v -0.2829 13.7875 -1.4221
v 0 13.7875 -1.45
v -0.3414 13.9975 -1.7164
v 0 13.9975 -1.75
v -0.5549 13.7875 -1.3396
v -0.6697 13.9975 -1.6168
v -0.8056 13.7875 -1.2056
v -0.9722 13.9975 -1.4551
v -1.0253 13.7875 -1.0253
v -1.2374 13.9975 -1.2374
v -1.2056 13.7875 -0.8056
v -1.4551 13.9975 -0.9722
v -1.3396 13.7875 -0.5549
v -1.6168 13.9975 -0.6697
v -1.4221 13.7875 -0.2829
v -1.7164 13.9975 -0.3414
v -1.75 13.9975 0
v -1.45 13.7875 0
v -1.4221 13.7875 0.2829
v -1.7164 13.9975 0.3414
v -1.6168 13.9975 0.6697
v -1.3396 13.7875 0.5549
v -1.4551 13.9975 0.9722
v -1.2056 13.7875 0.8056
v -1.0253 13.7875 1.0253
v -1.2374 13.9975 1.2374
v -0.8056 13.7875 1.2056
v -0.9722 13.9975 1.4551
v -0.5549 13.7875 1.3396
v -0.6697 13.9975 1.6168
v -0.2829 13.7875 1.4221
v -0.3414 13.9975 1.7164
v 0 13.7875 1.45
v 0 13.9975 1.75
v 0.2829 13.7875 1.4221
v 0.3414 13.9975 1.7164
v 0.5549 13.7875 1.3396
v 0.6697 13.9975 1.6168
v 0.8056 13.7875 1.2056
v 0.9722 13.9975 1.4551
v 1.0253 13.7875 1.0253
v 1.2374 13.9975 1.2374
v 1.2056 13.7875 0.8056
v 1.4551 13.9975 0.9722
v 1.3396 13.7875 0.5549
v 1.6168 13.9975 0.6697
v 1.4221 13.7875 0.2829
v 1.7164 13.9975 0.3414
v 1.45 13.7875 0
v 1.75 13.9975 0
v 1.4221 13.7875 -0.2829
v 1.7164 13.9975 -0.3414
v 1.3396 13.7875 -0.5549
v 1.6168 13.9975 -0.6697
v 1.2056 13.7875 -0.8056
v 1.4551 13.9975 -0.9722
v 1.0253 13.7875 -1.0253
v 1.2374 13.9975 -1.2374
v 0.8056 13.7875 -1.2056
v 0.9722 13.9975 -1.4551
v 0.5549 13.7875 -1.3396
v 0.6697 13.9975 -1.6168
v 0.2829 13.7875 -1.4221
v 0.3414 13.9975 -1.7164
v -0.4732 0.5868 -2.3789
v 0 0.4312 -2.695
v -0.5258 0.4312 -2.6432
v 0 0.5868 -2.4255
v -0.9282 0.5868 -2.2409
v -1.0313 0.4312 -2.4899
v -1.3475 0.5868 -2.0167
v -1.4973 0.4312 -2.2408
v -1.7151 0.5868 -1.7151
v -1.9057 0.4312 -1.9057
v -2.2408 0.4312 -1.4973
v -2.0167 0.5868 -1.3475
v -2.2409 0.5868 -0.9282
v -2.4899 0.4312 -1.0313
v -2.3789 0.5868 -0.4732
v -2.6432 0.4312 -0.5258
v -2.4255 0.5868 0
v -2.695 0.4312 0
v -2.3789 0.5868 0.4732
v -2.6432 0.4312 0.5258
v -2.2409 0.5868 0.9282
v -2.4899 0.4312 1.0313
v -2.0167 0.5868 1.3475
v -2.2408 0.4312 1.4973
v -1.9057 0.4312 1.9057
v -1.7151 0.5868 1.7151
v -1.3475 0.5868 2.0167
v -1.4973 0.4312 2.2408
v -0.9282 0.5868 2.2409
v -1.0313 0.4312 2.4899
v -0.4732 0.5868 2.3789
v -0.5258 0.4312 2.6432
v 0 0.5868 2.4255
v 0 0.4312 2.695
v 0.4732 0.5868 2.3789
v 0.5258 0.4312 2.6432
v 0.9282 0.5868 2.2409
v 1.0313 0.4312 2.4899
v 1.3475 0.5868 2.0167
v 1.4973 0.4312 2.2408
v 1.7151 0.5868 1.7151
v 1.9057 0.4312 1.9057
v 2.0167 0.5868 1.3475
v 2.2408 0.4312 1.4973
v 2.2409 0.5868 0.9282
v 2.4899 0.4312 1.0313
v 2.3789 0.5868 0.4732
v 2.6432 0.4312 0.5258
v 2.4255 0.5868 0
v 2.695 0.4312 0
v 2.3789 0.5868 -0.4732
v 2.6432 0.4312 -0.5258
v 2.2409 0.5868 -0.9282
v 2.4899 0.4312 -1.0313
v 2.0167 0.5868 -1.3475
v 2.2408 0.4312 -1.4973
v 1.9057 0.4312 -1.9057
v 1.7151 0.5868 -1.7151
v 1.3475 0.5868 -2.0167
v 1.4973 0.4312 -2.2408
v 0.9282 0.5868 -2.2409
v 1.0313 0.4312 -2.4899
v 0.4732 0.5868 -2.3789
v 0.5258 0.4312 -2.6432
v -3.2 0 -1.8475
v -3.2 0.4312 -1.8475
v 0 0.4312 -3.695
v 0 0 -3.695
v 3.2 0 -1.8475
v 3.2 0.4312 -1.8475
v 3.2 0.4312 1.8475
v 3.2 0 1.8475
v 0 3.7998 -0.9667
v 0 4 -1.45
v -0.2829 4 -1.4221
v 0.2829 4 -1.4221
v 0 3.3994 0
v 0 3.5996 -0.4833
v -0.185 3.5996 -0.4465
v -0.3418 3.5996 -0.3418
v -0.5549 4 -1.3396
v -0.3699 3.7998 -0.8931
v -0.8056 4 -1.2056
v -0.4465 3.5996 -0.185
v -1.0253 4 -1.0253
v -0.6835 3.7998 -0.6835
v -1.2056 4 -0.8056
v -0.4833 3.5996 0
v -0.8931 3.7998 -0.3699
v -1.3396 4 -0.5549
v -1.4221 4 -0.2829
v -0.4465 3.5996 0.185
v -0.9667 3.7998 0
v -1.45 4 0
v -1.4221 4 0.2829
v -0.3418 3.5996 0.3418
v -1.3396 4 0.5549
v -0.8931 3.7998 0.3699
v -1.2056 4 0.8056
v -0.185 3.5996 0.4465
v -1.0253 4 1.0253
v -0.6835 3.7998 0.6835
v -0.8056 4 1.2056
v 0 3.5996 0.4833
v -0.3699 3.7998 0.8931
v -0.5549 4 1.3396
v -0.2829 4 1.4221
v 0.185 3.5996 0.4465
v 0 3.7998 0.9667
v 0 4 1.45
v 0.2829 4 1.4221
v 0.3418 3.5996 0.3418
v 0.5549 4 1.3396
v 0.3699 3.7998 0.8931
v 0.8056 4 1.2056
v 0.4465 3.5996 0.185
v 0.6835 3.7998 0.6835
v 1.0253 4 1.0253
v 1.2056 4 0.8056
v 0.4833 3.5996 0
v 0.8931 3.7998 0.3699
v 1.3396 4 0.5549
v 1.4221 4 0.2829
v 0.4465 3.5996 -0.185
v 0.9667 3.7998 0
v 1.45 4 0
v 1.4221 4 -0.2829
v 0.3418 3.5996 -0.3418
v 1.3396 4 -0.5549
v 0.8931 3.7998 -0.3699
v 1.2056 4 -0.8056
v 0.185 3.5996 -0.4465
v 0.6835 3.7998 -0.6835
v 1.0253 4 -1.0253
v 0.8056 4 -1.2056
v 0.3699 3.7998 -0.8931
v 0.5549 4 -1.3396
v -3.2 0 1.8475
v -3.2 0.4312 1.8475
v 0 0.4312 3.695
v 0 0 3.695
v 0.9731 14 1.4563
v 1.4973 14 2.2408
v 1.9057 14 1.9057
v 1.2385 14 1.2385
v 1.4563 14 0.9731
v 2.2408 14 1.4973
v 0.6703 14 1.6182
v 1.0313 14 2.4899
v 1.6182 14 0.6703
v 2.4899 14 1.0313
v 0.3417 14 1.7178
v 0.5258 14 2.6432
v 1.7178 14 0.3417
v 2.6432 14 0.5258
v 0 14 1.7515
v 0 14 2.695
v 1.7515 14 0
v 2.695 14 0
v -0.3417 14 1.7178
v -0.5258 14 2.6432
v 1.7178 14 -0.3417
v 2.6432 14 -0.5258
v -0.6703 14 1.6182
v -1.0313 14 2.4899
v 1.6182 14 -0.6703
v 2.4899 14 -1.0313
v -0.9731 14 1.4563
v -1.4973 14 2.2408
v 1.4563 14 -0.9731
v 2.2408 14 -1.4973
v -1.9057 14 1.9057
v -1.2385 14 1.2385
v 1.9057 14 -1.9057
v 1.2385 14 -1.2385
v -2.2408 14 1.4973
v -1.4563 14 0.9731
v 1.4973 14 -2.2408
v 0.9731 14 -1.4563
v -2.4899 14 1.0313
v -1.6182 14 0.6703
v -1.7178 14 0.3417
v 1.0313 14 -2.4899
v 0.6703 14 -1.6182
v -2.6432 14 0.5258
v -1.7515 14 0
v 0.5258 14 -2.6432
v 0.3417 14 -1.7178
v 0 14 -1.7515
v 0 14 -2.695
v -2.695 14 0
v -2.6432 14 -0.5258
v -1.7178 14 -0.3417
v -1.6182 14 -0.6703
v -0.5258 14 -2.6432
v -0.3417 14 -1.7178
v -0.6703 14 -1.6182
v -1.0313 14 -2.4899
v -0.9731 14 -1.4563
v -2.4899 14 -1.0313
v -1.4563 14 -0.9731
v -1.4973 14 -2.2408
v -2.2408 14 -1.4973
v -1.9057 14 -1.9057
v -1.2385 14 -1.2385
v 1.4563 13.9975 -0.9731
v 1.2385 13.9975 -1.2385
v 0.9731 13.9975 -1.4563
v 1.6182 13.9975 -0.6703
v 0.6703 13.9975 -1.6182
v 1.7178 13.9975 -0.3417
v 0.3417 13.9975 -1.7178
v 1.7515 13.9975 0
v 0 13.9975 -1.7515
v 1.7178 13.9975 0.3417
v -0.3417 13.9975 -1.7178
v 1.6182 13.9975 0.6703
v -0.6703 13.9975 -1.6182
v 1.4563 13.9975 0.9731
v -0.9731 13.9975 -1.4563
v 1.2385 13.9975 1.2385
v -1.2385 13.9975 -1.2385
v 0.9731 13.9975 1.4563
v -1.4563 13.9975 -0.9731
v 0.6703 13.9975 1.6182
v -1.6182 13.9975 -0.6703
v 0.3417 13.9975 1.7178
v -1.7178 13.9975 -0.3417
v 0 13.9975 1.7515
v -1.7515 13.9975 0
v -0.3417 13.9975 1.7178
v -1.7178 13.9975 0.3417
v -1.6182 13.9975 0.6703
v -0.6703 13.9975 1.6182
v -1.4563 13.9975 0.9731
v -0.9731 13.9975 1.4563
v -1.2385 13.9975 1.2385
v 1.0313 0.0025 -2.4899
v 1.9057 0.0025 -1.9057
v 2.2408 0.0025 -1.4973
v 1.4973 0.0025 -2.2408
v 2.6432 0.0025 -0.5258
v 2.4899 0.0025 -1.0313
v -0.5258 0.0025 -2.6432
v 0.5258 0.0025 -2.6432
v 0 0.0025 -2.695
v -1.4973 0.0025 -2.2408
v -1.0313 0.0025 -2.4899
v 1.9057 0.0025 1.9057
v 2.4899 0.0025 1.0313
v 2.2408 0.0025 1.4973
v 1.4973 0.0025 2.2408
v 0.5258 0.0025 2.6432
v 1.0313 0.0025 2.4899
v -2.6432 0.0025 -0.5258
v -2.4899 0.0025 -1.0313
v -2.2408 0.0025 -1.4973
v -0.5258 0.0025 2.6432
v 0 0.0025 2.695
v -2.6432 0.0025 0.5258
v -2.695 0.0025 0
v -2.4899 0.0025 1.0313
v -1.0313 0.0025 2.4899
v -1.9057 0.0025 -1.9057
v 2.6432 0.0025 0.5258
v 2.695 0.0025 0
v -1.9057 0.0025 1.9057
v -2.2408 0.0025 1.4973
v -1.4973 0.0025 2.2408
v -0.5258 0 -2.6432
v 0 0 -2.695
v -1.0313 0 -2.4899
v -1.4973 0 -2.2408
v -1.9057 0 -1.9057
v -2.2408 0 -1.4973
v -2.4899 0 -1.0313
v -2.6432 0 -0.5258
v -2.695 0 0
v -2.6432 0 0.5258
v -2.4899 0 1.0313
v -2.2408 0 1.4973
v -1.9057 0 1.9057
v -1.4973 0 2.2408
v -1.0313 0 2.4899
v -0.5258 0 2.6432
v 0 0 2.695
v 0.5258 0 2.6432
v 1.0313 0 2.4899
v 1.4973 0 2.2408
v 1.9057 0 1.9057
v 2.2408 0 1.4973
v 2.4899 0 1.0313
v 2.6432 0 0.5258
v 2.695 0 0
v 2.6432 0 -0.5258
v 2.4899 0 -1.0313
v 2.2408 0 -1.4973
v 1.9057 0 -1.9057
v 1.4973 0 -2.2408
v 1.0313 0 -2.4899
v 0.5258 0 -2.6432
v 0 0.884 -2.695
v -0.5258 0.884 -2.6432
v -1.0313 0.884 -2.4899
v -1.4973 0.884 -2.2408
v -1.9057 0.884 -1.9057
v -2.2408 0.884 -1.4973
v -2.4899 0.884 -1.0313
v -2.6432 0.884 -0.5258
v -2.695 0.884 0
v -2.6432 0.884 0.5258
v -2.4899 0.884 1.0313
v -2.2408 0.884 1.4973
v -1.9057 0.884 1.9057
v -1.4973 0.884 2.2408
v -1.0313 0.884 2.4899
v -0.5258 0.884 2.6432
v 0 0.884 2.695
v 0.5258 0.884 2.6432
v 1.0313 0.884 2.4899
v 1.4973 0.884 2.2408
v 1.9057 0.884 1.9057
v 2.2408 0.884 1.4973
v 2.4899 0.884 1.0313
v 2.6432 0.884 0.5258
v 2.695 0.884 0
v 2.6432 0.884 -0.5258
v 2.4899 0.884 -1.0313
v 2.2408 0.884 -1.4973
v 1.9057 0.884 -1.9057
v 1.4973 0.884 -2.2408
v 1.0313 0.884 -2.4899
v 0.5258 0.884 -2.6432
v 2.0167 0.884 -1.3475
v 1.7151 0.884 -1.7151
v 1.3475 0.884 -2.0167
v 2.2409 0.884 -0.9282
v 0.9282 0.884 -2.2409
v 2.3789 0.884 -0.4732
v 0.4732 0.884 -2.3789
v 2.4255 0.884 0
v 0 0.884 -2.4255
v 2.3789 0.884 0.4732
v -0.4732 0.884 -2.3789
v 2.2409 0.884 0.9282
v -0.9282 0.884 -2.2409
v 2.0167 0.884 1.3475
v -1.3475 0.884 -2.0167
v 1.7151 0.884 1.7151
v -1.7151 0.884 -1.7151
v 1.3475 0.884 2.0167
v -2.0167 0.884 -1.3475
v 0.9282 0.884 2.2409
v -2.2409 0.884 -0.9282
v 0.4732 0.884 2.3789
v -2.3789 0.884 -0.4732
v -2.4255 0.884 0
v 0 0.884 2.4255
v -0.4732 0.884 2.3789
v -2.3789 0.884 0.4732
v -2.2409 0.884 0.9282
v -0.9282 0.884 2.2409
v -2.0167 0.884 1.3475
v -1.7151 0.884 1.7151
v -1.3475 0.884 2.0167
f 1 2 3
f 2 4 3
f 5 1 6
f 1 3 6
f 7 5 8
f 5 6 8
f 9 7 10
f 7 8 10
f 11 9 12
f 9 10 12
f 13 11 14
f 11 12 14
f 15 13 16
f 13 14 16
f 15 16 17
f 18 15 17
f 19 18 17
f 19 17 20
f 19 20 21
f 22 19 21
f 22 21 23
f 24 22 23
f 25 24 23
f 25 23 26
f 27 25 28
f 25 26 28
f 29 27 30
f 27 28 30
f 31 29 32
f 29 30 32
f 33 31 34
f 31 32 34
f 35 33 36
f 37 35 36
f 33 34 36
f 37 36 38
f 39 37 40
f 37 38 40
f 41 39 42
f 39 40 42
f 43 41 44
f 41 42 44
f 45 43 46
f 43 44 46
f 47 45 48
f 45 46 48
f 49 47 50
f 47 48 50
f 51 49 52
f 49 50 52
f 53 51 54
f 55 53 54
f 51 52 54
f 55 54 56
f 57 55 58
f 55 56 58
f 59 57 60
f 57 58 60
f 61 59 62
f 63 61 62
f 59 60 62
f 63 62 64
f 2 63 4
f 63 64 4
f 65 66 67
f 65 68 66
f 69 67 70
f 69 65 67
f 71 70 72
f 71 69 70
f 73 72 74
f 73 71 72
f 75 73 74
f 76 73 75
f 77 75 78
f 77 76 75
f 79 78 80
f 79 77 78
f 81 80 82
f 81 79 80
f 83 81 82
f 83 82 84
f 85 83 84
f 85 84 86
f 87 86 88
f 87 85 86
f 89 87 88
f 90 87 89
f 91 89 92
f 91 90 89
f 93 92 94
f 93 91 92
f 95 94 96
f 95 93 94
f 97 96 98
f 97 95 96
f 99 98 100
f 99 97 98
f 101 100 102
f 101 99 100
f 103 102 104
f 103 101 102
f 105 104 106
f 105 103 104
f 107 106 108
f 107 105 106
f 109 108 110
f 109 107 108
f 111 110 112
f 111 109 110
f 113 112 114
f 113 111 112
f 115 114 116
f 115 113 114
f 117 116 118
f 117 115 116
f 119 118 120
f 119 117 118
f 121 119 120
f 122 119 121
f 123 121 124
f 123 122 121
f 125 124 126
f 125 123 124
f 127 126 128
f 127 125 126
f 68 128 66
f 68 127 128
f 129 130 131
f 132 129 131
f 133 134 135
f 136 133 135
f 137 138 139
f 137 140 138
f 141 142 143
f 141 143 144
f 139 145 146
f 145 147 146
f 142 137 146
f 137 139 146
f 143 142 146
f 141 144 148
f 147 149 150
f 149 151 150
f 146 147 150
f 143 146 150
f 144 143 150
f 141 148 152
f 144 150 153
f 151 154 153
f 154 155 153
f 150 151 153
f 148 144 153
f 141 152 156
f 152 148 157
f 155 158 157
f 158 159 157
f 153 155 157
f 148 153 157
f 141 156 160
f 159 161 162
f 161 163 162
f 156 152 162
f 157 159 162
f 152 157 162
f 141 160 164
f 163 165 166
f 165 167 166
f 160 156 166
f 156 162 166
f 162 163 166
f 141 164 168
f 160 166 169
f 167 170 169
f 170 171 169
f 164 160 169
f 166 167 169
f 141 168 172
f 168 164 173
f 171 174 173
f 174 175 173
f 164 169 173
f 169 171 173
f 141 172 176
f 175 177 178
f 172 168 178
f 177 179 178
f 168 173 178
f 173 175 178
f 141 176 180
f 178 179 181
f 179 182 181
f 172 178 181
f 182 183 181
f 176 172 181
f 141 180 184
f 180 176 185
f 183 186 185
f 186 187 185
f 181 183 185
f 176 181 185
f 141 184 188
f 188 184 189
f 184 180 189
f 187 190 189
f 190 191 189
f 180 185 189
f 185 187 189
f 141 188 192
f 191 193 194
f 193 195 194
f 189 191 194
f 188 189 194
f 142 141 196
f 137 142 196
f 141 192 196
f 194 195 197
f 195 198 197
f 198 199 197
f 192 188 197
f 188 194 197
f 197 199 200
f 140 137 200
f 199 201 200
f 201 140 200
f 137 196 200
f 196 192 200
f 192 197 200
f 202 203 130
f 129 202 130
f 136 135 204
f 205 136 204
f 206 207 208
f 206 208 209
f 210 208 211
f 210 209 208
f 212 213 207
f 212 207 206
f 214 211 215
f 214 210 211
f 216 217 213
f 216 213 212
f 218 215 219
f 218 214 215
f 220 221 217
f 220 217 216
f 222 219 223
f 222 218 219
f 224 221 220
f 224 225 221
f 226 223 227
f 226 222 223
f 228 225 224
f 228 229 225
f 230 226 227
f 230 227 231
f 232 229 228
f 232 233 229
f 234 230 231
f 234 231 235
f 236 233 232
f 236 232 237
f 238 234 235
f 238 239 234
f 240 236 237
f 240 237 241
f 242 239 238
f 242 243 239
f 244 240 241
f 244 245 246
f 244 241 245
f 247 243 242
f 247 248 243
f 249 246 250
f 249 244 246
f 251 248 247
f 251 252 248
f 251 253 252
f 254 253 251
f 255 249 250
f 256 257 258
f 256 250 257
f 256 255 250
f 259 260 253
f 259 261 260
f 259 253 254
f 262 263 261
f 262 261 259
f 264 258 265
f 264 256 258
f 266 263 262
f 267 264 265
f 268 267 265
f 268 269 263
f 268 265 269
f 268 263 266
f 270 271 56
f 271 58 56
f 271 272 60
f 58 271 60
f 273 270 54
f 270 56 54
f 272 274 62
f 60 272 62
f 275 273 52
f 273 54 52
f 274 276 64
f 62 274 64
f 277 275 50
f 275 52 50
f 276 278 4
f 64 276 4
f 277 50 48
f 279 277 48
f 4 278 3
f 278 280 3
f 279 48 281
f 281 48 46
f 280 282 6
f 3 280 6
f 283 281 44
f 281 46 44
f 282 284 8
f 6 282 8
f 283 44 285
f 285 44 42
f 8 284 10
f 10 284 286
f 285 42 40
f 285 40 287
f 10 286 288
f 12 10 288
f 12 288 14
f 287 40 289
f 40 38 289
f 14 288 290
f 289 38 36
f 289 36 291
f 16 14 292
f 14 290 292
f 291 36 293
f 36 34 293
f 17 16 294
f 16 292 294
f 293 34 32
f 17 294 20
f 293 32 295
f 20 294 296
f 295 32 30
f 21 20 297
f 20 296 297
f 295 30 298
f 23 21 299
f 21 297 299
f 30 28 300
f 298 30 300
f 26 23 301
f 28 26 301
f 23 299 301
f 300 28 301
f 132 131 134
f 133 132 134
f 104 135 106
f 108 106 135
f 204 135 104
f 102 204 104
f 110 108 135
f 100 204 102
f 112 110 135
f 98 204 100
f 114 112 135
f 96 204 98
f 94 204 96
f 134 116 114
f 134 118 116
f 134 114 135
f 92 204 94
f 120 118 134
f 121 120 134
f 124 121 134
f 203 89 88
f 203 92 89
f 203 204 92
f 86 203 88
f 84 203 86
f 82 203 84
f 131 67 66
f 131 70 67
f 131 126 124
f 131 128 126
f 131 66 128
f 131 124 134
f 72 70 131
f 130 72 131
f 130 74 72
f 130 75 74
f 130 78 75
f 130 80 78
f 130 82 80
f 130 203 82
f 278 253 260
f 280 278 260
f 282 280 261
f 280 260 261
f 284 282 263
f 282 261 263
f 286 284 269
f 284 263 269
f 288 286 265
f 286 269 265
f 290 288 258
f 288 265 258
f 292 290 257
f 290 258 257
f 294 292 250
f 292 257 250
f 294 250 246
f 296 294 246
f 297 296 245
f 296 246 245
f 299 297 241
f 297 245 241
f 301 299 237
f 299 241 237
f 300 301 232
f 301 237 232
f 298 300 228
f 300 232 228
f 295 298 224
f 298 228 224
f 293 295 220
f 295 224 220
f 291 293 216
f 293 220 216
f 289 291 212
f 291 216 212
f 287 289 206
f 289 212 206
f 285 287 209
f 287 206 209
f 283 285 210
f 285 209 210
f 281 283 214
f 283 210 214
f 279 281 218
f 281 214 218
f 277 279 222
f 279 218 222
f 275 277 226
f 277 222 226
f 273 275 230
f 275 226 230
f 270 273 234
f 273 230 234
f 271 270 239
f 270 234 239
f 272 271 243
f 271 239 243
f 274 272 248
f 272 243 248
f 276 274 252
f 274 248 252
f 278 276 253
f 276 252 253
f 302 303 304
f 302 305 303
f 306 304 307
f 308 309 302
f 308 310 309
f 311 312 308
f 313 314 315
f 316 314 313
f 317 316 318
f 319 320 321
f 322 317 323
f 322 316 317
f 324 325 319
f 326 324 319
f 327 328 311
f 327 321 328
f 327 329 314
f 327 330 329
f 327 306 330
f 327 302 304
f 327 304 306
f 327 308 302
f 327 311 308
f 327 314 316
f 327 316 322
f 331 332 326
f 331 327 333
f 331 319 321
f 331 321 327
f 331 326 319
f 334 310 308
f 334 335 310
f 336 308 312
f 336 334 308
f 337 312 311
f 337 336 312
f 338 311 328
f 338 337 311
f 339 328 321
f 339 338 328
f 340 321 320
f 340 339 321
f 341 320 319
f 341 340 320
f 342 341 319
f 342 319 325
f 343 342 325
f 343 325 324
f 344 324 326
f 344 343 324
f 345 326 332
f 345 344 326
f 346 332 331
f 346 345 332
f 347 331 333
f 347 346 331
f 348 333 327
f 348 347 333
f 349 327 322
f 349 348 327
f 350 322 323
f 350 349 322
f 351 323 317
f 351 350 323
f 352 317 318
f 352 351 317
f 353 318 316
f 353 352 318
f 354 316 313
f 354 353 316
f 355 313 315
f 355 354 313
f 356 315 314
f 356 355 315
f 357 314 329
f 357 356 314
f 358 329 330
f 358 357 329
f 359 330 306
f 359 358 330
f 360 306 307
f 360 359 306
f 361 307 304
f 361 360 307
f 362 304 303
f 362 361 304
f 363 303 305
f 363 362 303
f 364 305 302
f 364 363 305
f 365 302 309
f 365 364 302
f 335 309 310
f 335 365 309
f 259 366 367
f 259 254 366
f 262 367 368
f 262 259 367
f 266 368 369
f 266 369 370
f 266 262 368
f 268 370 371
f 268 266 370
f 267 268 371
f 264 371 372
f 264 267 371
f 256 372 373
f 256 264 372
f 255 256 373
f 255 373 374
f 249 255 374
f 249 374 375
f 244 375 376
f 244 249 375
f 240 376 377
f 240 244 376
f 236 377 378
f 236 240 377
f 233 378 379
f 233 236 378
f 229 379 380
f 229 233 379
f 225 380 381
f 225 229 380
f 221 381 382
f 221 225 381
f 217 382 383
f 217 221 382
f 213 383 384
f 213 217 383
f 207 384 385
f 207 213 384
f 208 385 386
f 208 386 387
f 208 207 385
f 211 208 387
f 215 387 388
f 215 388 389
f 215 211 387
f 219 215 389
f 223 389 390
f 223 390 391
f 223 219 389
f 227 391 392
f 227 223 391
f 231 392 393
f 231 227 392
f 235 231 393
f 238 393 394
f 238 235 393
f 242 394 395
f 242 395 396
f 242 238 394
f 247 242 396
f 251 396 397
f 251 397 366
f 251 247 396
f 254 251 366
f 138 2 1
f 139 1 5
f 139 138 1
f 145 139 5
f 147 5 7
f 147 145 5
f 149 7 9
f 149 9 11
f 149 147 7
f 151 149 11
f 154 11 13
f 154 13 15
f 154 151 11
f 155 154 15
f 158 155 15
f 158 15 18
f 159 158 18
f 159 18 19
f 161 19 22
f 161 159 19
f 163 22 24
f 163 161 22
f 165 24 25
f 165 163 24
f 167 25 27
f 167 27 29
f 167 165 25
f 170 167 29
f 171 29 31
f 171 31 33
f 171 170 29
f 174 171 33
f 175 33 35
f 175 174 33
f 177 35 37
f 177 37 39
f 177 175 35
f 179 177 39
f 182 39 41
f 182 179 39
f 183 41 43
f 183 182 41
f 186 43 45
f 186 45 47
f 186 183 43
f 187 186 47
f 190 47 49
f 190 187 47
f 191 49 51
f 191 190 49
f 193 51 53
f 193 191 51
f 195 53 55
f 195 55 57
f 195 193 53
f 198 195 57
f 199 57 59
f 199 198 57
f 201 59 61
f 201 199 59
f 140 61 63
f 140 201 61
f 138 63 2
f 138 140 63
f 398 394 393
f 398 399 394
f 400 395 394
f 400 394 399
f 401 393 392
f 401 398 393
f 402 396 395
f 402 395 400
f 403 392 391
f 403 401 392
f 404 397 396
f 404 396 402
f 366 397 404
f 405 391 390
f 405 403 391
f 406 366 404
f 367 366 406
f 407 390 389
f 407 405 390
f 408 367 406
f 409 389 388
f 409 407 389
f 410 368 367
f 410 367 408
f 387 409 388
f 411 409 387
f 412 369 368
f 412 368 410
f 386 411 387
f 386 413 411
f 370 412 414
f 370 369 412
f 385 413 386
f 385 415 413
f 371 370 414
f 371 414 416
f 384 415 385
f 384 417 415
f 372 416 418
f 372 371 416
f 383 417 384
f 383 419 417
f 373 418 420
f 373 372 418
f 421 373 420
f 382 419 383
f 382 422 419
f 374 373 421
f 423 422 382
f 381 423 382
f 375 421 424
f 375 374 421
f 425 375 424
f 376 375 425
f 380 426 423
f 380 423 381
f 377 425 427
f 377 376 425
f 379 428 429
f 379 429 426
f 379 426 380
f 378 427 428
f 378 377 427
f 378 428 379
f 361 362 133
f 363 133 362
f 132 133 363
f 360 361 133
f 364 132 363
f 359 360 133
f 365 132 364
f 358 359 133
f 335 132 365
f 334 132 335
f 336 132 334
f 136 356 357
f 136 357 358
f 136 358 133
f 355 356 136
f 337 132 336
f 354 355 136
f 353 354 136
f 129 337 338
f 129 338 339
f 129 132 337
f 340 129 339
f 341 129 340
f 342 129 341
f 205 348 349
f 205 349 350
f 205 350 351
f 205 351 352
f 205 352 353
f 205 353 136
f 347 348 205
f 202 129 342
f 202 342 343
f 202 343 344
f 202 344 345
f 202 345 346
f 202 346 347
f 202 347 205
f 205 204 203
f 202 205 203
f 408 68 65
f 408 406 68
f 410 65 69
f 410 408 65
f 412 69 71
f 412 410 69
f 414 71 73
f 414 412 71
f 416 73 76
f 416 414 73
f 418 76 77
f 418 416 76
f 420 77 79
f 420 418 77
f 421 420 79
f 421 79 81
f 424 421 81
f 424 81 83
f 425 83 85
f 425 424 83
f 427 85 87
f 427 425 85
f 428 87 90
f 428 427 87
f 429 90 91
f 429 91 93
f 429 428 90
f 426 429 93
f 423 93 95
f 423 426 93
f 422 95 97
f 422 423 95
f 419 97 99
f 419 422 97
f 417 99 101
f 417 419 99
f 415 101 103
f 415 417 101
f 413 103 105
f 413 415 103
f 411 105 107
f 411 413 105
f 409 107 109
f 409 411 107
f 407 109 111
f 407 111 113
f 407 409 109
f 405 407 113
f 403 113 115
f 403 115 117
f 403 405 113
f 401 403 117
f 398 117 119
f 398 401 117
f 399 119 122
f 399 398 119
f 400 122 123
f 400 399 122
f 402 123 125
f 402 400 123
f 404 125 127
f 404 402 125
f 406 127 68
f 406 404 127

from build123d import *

# Parameters (mm, degrees)
HEXDIESKE_R  = 3.7125
HEXDIE_DEPTH = 0.4312


with BuildPart() as part:
    # BodySke → Body (revolve)
    with BuildSketch(Plane.XY, mode=Mode.PRIVATE) as body_sk:
        Polygon((2.695, 0), (3.712, 0), (3.712, 0.4312), (2.695, 0.4312), (2.4255, 0.586795898), (2.4255, 0.88396), (2.695, 0.88396), (2.695, 14), (1.45, 14), (1.45, 7), (0, 7), (0, 0.00254), (2.695, 0.00254), align=None)
    revolve(body_sk.sketch.rotate(Axis((0, 0, 0), (0, 1, 0)), 90), axis=Axis((0, 0, 0), (0, 1, 0)))

    # TapDriSke → TapDrill (revolve, cut)
    with BuildSketch(Plane.XY, mode=Mode.PRIVATE) as tapdrill_sk:
        Polygon((1.45, 4), (1.45, 14), (0, 14), (0, 3.399390335), align=None)
    revolve(tapdrill_sk.sketch.rotate(Axis((0, 0, 0), (0, 1, 0)), 90), axis=Axis((0, 0, 0), (0, 1, 0)), mode=Mode.SUBTRACT)

    # EndChamferSke → EndChamfer (revolve, cut)
    with BuildSketch(Plane.XY, mode=Mode.PRIVATE) as endchamfer_sk:
        Polygon((1.7515, 13.99746), (1.7515, 14.254), (1.45, 14.254), (1.45, 13.78747576), (1.75, 13.99746), align=None)
    revolve(endchamfer_sk.sketch.rotate(Axis((0, -2.54, 0), (0, 1, 0)), 90), axis=Axis((0, -2.54, 0), (0, 1, 0)), mode=Mode.SUBTRACT)

    # HexDieSke → HexDie (cut)
    with BuildSketch(Plane(origin=(0, 0.4312, 0), x_dir=(-1, 0, 0), z_dir=(0, 1, 0))):
        Circle(HEXDIESKE_R)
        Polygon((0, 3.695041723), (3.2, 1.847520861), (3.2, -1.847520861), (0, -3.695041723), (-3.2, -1.847520861), (-3.2, 1.847520861), align=None, mode=Mode.SUBTRACT)
    extrude(amount=-HEXDIE_DEPTH, mode=Mode.SUBTRACT)


solid = part.part
